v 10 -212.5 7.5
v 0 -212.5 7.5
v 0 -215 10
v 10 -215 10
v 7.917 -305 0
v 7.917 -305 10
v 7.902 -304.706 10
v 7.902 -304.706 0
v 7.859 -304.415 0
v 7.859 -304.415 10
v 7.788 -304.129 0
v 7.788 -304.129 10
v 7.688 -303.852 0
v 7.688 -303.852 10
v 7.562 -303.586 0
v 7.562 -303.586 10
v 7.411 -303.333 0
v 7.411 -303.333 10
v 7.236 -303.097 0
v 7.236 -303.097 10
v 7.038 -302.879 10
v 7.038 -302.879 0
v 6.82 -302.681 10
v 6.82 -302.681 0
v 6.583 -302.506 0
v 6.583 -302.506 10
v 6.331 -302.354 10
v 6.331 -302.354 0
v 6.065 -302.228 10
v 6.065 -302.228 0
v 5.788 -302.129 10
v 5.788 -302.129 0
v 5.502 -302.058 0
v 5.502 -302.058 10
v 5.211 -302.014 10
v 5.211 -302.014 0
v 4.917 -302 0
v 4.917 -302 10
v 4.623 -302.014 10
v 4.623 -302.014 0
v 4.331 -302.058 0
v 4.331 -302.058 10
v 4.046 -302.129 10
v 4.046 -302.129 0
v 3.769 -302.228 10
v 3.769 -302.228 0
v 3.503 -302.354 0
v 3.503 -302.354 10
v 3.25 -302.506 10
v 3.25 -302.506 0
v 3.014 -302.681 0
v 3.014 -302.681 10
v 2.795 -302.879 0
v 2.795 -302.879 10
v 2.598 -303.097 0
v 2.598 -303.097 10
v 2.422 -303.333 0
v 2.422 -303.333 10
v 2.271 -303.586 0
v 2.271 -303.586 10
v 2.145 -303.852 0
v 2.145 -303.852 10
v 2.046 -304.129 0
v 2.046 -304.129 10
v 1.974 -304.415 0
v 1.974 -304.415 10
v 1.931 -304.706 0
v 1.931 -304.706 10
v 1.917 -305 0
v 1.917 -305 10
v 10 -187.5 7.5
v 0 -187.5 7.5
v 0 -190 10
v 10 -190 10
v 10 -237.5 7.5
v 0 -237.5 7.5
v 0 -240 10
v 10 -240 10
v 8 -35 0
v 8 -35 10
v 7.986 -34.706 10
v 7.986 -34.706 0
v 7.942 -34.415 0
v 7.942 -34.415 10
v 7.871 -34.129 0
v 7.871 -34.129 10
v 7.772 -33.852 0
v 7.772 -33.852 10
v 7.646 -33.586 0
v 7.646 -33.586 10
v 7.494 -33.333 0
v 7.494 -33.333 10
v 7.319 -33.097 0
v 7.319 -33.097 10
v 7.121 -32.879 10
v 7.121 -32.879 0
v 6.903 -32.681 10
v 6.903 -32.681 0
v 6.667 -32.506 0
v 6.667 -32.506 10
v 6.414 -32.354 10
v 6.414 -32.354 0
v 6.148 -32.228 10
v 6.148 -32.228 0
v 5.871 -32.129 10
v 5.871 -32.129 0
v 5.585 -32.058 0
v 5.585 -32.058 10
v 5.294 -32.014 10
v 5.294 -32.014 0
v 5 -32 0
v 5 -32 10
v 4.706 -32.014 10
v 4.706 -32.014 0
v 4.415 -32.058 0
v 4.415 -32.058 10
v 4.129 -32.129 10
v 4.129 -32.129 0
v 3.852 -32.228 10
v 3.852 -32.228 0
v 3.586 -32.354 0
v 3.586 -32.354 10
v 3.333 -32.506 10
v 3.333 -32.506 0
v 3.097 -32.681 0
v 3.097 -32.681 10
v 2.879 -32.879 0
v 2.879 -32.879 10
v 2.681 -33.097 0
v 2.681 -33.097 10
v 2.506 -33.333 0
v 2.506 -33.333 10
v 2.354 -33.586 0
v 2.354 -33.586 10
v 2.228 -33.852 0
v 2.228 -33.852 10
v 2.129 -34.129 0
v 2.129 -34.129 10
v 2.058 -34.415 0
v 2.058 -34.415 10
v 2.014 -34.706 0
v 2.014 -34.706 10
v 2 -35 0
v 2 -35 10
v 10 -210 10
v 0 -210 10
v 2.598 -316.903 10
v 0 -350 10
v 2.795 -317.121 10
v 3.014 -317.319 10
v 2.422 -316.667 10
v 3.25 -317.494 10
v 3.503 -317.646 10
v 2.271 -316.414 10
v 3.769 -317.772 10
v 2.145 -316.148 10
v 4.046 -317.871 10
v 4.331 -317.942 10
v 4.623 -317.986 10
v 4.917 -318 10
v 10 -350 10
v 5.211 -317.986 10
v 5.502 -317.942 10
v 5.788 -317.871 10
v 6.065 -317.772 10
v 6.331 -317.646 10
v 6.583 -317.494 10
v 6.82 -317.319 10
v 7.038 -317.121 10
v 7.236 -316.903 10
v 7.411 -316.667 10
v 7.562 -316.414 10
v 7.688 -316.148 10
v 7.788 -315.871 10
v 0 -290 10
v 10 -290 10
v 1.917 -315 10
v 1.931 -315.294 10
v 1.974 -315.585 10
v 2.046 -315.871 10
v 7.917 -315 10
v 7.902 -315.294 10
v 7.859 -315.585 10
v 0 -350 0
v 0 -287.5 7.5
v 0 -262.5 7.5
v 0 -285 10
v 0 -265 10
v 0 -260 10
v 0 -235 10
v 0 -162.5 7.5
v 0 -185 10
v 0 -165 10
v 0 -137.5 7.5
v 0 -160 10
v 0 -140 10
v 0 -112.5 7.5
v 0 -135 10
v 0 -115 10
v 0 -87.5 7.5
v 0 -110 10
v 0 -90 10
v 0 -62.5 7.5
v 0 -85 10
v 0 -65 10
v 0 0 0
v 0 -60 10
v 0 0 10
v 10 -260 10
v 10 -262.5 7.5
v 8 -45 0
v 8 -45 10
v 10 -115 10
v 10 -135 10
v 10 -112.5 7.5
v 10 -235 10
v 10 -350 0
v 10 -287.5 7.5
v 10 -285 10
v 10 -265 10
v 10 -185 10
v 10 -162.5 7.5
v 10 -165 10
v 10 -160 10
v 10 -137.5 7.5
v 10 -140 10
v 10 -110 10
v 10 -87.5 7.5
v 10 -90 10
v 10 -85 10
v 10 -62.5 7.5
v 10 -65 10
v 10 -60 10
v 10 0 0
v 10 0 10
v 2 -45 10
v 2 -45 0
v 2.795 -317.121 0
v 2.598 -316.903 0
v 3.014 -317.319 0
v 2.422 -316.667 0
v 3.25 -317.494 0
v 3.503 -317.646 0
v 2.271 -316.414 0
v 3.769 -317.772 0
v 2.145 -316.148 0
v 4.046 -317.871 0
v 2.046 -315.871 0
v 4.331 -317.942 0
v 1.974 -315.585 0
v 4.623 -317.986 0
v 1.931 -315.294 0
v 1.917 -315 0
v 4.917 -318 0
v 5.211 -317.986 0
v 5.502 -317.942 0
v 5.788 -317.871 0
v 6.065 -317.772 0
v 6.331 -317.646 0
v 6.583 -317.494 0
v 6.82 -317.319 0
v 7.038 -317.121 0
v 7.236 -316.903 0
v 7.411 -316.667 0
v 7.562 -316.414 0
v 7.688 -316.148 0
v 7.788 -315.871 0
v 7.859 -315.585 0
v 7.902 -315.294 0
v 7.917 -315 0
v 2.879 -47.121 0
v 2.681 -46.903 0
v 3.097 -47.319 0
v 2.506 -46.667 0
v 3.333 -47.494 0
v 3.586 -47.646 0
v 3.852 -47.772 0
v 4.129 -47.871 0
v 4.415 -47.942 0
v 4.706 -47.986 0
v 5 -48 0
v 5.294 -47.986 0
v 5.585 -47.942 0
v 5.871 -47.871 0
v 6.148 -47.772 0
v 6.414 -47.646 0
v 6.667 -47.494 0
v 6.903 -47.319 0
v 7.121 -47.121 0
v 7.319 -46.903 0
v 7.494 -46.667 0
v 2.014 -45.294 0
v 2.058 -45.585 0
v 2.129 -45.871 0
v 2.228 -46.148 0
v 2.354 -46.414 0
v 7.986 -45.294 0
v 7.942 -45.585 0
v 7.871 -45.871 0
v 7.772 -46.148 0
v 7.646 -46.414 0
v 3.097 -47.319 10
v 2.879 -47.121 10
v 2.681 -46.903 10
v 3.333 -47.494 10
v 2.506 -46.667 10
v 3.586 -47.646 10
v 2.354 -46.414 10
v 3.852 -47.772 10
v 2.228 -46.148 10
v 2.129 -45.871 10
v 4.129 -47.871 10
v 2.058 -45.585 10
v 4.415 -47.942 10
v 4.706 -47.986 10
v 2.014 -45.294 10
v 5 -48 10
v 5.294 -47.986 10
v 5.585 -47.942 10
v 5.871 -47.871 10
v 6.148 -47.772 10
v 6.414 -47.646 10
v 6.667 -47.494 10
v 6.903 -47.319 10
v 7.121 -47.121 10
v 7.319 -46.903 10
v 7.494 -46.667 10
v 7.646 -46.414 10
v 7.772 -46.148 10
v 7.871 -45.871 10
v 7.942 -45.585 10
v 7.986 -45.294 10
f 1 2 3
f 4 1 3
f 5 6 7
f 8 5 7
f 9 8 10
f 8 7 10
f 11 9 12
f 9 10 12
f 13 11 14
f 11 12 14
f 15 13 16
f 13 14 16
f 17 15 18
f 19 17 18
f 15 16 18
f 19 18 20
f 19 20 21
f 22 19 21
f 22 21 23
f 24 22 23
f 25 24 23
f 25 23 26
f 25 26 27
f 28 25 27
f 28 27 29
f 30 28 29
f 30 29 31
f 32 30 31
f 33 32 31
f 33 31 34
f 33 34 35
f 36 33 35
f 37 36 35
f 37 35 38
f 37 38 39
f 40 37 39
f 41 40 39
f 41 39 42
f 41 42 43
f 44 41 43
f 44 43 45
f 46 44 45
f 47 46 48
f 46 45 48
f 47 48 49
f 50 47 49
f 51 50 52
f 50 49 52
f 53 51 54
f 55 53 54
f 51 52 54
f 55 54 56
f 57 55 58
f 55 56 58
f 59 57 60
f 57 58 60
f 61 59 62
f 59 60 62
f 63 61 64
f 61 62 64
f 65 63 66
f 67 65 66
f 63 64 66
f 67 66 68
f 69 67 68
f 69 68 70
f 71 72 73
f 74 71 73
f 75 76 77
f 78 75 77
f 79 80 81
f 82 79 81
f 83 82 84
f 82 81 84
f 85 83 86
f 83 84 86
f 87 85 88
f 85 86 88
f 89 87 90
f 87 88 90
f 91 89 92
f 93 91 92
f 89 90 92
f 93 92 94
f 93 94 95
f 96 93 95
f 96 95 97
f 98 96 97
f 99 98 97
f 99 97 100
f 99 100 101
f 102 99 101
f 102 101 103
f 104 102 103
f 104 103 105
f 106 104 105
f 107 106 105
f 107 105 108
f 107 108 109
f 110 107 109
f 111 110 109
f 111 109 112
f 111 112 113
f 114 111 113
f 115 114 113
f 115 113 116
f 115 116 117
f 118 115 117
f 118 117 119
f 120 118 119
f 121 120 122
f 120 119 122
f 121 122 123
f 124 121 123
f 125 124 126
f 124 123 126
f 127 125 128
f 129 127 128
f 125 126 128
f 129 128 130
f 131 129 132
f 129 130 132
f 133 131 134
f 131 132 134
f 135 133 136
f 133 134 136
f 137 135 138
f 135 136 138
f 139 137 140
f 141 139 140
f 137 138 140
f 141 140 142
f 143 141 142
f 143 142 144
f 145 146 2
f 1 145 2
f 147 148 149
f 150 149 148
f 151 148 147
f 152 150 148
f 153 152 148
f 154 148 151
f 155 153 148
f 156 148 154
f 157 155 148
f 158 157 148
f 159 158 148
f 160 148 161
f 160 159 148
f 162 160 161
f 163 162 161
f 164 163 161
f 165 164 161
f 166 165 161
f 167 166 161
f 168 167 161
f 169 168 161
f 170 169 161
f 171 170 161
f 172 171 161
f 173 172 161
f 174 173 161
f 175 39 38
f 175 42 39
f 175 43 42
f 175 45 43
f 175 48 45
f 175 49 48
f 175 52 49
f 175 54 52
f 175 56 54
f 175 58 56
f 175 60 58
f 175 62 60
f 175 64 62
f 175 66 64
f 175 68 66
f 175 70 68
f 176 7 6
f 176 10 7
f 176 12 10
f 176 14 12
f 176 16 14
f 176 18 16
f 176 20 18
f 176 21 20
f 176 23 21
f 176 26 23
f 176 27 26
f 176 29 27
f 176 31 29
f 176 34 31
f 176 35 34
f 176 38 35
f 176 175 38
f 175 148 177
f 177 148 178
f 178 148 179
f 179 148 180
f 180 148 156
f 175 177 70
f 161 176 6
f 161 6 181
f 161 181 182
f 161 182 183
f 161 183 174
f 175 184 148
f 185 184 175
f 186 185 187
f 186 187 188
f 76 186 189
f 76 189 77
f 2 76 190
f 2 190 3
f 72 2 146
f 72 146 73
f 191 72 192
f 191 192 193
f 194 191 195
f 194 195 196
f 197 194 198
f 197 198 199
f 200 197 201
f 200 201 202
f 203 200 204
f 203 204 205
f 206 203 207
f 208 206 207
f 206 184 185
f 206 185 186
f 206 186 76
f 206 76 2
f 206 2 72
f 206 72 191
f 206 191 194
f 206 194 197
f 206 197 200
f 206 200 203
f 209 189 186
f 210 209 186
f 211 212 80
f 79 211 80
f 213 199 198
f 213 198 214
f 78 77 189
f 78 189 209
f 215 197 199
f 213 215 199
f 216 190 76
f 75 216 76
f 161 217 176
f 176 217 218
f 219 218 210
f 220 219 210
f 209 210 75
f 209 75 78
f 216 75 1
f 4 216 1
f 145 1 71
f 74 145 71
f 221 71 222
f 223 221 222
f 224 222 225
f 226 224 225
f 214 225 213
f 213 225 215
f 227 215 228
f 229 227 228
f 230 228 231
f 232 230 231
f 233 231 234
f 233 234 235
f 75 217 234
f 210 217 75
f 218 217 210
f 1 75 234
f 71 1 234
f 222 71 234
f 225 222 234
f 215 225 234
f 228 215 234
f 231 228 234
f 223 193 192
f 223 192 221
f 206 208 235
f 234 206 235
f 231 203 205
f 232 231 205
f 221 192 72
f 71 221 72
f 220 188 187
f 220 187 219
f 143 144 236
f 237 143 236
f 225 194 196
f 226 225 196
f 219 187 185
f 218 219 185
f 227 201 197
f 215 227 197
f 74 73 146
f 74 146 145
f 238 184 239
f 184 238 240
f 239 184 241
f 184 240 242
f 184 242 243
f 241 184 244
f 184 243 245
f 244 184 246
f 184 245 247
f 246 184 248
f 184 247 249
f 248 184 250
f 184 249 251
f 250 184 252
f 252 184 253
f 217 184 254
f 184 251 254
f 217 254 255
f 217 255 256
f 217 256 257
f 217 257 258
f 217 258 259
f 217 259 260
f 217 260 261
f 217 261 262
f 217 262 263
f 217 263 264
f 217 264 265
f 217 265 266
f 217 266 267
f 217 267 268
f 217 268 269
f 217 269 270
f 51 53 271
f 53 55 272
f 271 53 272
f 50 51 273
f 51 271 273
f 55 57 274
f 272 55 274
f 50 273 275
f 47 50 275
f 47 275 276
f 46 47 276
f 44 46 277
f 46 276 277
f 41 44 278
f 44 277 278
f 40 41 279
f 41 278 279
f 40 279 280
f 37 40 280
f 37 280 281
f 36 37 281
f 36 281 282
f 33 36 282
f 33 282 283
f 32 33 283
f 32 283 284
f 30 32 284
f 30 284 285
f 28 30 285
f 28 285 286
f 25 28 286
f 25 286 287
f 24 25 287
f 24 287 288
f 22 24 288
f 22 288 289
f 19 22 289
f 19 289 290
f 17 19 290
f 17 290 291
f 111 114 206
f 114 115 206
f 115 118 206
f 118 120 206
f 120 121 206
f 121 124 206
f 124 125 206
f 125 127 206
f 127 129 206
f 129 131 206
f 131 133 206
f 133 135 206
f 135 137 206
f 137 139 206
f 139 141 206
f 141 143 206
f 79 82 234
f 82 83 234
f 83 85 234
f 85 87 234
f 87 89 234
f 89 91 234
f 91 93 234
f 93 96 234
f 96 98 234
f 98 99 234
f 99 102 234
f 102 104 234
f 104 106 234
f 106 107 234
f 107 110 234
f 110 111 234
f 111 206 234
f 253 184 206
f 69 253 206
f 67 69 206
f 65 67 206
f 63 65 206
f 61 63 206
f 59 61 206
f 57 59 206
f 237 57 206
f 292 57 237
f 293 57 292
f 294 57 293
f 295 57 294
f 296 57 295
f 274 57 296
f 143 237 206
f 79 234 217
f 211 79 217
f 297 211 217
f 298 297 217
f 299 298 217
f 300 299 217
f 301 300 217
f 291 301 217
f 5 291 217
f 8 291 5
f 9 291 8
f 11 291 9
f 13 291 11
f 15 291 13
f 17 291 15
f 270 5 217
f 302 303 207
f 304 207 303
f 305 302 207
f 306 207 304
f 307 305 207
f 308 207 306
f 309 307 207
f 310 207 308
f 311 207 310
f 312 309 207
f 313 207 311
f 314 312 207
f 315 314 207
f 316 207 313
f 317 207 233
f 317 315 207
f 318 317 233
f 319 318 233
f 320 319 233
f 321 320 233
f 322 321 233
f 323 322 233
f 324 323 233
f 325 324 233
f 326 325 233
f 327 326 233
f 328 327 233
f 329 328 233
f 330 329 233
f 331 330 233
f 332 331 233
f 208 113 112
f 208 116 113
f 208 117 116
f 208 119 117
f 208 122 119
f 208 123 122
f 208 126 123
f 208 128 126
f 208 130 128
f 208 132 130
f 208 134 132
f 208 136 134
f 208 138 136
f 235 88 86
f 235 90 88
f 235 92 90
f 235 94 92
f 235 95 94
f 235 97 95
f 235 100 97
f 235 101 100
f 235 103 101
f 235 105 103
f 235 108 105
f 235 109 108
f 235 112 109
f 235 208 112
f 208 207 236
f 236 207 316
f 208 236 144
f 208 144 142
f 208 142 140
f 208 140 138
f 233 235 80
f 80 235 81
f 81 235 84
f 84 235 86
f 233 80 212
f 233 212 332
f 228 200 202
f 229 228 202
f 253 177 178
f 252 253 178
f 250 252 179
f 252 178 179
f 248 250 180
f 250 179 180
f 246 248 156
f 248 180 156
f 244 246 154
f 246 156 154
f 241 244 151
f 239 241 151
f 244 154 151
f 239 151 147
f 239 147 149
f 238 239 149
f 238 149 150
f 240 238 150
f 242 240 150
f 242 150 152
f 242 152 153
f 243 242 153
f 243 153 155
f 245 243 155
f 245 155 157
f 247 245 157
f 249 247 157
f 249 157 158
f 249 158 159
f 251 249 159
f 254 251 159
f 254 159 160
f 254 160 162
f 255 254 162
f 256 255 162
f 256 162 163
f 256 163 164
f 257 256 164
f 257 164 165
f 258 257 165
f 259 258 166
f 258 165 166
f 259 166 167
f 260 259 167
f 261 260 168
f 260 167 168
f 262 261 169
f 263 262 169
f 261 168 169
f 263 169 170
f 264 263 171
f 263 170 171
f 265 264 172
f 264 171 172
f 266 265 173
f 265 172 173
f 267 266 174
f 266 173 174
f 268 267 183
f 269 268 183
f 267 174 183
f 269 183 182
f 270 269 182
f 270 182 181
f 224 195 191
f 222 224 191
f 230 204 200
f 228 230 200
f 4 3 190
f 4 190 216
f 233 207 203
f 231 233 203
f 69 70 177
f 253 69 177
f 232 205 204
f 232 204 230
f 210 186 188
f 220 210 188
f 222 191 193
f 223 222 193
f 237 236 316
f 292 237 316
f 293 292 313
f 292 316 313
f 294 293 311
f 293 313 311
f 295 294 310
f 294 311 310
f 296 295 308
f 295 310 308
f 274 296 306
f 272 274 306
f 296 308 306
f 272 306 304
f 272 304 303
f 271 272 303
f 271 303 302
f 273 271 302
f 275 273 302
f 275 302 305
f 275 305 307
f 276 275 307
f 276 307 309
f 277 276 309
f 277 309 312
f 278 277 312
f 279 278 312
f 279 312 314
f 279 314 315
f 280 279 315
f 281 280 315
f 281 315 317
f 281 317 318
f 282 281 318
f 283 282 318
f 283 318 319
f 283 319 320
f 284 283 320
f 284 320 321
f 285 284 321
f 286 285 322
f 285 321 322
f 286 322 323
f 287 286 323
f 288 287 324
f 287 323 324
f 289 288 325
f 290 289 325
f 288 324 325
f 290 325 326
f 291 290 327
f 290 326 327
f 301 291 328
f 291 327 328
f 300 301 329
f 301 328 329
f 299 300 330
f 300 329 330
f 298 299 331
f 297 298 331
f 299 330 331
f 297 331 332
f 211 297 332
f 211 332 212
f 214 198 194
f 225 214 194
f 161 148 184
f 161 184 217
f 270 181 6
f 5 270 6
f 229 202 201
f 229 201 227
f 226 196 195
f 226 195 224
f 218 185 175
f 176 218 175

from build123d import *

# Parameters (mm, degrees)
F0_W     = 10
F0_H     = 10
F1_DEPTH = 350
F3_DEPTH = 25
F5_DEPTH = 10.001


with BuildPart() as f1:
    # F0 (on Front) → F1 (new body)
    with BuildSketch(Plane.XZ):
        with Locations((5, 5)):
            Rectangle(F0_W, F0_H)
    extrude(amount=F1_DEPTH)

    # F2 (on face) → F3 (cut)
    with BuildSketch(Plane(origin=(0, 0, 0), x_dir=(0, -1, 0), z_dir=(-1, 0, 0))):
        Polygon((62.5, 7.5), (65, 10), (60, 10), align=None)
        Polygon((87.5, 7.5), (90, 10), (85, 10), align=None)
        Polygon((112.5, 7.5), (115, 10), (110, 10), align=None)
        Polygon((137.5, 7.5), (140, 10), (135, 10), align=None)
        Polygon((162.5, 7.5), (165, 10), (160, 10), align=None)
        Polygon((187.5, 7.5), (190, 10), (185, 10), align=None)
        Polygon((212.5, 7.5), (215, 10), (210, 10), align=None)
        Polygon((237.5, 7.5), (240, 10), (235, 10), align=None)
        Polygon((262.5, 7.5), (265, 10), (260, 10), align=None)
        Polygon((287.5, 7.5), (290, 10), (285, 10), align=None)
    extrude(amount=-F3_DEPTH, mode=Mode.SUBTRACT)

    # F4 (on face) → F5 (cut, through all)
    with BuildSketch(Plane.XY.offset(10)):
        with BuildLine():
            Line((8, -45), (8, -35))
            ThreePointArc((8, -35), (5, -32), (2, -35))
            Line((2, -35), (2, -45))
            ThreePointArc((2, -45), (5, -48), (8, -45))
        make_face()
        with BuildLine():
            Line((7.916715, -315), (7.916715, -305))
            ThreePointArc((7.916715, -305), (4.916715, -302), (1.916715, -305))
            Line((1.916715, -305), (1.916715, -315))
            ThreePointArc((1.916715, -315), (4.916715, -318), (7.916715, -315))
        make_face()
    extrude(amount=-F5_DEPTH, mode=Mode.SUBTRACT)


solid = f1.part
